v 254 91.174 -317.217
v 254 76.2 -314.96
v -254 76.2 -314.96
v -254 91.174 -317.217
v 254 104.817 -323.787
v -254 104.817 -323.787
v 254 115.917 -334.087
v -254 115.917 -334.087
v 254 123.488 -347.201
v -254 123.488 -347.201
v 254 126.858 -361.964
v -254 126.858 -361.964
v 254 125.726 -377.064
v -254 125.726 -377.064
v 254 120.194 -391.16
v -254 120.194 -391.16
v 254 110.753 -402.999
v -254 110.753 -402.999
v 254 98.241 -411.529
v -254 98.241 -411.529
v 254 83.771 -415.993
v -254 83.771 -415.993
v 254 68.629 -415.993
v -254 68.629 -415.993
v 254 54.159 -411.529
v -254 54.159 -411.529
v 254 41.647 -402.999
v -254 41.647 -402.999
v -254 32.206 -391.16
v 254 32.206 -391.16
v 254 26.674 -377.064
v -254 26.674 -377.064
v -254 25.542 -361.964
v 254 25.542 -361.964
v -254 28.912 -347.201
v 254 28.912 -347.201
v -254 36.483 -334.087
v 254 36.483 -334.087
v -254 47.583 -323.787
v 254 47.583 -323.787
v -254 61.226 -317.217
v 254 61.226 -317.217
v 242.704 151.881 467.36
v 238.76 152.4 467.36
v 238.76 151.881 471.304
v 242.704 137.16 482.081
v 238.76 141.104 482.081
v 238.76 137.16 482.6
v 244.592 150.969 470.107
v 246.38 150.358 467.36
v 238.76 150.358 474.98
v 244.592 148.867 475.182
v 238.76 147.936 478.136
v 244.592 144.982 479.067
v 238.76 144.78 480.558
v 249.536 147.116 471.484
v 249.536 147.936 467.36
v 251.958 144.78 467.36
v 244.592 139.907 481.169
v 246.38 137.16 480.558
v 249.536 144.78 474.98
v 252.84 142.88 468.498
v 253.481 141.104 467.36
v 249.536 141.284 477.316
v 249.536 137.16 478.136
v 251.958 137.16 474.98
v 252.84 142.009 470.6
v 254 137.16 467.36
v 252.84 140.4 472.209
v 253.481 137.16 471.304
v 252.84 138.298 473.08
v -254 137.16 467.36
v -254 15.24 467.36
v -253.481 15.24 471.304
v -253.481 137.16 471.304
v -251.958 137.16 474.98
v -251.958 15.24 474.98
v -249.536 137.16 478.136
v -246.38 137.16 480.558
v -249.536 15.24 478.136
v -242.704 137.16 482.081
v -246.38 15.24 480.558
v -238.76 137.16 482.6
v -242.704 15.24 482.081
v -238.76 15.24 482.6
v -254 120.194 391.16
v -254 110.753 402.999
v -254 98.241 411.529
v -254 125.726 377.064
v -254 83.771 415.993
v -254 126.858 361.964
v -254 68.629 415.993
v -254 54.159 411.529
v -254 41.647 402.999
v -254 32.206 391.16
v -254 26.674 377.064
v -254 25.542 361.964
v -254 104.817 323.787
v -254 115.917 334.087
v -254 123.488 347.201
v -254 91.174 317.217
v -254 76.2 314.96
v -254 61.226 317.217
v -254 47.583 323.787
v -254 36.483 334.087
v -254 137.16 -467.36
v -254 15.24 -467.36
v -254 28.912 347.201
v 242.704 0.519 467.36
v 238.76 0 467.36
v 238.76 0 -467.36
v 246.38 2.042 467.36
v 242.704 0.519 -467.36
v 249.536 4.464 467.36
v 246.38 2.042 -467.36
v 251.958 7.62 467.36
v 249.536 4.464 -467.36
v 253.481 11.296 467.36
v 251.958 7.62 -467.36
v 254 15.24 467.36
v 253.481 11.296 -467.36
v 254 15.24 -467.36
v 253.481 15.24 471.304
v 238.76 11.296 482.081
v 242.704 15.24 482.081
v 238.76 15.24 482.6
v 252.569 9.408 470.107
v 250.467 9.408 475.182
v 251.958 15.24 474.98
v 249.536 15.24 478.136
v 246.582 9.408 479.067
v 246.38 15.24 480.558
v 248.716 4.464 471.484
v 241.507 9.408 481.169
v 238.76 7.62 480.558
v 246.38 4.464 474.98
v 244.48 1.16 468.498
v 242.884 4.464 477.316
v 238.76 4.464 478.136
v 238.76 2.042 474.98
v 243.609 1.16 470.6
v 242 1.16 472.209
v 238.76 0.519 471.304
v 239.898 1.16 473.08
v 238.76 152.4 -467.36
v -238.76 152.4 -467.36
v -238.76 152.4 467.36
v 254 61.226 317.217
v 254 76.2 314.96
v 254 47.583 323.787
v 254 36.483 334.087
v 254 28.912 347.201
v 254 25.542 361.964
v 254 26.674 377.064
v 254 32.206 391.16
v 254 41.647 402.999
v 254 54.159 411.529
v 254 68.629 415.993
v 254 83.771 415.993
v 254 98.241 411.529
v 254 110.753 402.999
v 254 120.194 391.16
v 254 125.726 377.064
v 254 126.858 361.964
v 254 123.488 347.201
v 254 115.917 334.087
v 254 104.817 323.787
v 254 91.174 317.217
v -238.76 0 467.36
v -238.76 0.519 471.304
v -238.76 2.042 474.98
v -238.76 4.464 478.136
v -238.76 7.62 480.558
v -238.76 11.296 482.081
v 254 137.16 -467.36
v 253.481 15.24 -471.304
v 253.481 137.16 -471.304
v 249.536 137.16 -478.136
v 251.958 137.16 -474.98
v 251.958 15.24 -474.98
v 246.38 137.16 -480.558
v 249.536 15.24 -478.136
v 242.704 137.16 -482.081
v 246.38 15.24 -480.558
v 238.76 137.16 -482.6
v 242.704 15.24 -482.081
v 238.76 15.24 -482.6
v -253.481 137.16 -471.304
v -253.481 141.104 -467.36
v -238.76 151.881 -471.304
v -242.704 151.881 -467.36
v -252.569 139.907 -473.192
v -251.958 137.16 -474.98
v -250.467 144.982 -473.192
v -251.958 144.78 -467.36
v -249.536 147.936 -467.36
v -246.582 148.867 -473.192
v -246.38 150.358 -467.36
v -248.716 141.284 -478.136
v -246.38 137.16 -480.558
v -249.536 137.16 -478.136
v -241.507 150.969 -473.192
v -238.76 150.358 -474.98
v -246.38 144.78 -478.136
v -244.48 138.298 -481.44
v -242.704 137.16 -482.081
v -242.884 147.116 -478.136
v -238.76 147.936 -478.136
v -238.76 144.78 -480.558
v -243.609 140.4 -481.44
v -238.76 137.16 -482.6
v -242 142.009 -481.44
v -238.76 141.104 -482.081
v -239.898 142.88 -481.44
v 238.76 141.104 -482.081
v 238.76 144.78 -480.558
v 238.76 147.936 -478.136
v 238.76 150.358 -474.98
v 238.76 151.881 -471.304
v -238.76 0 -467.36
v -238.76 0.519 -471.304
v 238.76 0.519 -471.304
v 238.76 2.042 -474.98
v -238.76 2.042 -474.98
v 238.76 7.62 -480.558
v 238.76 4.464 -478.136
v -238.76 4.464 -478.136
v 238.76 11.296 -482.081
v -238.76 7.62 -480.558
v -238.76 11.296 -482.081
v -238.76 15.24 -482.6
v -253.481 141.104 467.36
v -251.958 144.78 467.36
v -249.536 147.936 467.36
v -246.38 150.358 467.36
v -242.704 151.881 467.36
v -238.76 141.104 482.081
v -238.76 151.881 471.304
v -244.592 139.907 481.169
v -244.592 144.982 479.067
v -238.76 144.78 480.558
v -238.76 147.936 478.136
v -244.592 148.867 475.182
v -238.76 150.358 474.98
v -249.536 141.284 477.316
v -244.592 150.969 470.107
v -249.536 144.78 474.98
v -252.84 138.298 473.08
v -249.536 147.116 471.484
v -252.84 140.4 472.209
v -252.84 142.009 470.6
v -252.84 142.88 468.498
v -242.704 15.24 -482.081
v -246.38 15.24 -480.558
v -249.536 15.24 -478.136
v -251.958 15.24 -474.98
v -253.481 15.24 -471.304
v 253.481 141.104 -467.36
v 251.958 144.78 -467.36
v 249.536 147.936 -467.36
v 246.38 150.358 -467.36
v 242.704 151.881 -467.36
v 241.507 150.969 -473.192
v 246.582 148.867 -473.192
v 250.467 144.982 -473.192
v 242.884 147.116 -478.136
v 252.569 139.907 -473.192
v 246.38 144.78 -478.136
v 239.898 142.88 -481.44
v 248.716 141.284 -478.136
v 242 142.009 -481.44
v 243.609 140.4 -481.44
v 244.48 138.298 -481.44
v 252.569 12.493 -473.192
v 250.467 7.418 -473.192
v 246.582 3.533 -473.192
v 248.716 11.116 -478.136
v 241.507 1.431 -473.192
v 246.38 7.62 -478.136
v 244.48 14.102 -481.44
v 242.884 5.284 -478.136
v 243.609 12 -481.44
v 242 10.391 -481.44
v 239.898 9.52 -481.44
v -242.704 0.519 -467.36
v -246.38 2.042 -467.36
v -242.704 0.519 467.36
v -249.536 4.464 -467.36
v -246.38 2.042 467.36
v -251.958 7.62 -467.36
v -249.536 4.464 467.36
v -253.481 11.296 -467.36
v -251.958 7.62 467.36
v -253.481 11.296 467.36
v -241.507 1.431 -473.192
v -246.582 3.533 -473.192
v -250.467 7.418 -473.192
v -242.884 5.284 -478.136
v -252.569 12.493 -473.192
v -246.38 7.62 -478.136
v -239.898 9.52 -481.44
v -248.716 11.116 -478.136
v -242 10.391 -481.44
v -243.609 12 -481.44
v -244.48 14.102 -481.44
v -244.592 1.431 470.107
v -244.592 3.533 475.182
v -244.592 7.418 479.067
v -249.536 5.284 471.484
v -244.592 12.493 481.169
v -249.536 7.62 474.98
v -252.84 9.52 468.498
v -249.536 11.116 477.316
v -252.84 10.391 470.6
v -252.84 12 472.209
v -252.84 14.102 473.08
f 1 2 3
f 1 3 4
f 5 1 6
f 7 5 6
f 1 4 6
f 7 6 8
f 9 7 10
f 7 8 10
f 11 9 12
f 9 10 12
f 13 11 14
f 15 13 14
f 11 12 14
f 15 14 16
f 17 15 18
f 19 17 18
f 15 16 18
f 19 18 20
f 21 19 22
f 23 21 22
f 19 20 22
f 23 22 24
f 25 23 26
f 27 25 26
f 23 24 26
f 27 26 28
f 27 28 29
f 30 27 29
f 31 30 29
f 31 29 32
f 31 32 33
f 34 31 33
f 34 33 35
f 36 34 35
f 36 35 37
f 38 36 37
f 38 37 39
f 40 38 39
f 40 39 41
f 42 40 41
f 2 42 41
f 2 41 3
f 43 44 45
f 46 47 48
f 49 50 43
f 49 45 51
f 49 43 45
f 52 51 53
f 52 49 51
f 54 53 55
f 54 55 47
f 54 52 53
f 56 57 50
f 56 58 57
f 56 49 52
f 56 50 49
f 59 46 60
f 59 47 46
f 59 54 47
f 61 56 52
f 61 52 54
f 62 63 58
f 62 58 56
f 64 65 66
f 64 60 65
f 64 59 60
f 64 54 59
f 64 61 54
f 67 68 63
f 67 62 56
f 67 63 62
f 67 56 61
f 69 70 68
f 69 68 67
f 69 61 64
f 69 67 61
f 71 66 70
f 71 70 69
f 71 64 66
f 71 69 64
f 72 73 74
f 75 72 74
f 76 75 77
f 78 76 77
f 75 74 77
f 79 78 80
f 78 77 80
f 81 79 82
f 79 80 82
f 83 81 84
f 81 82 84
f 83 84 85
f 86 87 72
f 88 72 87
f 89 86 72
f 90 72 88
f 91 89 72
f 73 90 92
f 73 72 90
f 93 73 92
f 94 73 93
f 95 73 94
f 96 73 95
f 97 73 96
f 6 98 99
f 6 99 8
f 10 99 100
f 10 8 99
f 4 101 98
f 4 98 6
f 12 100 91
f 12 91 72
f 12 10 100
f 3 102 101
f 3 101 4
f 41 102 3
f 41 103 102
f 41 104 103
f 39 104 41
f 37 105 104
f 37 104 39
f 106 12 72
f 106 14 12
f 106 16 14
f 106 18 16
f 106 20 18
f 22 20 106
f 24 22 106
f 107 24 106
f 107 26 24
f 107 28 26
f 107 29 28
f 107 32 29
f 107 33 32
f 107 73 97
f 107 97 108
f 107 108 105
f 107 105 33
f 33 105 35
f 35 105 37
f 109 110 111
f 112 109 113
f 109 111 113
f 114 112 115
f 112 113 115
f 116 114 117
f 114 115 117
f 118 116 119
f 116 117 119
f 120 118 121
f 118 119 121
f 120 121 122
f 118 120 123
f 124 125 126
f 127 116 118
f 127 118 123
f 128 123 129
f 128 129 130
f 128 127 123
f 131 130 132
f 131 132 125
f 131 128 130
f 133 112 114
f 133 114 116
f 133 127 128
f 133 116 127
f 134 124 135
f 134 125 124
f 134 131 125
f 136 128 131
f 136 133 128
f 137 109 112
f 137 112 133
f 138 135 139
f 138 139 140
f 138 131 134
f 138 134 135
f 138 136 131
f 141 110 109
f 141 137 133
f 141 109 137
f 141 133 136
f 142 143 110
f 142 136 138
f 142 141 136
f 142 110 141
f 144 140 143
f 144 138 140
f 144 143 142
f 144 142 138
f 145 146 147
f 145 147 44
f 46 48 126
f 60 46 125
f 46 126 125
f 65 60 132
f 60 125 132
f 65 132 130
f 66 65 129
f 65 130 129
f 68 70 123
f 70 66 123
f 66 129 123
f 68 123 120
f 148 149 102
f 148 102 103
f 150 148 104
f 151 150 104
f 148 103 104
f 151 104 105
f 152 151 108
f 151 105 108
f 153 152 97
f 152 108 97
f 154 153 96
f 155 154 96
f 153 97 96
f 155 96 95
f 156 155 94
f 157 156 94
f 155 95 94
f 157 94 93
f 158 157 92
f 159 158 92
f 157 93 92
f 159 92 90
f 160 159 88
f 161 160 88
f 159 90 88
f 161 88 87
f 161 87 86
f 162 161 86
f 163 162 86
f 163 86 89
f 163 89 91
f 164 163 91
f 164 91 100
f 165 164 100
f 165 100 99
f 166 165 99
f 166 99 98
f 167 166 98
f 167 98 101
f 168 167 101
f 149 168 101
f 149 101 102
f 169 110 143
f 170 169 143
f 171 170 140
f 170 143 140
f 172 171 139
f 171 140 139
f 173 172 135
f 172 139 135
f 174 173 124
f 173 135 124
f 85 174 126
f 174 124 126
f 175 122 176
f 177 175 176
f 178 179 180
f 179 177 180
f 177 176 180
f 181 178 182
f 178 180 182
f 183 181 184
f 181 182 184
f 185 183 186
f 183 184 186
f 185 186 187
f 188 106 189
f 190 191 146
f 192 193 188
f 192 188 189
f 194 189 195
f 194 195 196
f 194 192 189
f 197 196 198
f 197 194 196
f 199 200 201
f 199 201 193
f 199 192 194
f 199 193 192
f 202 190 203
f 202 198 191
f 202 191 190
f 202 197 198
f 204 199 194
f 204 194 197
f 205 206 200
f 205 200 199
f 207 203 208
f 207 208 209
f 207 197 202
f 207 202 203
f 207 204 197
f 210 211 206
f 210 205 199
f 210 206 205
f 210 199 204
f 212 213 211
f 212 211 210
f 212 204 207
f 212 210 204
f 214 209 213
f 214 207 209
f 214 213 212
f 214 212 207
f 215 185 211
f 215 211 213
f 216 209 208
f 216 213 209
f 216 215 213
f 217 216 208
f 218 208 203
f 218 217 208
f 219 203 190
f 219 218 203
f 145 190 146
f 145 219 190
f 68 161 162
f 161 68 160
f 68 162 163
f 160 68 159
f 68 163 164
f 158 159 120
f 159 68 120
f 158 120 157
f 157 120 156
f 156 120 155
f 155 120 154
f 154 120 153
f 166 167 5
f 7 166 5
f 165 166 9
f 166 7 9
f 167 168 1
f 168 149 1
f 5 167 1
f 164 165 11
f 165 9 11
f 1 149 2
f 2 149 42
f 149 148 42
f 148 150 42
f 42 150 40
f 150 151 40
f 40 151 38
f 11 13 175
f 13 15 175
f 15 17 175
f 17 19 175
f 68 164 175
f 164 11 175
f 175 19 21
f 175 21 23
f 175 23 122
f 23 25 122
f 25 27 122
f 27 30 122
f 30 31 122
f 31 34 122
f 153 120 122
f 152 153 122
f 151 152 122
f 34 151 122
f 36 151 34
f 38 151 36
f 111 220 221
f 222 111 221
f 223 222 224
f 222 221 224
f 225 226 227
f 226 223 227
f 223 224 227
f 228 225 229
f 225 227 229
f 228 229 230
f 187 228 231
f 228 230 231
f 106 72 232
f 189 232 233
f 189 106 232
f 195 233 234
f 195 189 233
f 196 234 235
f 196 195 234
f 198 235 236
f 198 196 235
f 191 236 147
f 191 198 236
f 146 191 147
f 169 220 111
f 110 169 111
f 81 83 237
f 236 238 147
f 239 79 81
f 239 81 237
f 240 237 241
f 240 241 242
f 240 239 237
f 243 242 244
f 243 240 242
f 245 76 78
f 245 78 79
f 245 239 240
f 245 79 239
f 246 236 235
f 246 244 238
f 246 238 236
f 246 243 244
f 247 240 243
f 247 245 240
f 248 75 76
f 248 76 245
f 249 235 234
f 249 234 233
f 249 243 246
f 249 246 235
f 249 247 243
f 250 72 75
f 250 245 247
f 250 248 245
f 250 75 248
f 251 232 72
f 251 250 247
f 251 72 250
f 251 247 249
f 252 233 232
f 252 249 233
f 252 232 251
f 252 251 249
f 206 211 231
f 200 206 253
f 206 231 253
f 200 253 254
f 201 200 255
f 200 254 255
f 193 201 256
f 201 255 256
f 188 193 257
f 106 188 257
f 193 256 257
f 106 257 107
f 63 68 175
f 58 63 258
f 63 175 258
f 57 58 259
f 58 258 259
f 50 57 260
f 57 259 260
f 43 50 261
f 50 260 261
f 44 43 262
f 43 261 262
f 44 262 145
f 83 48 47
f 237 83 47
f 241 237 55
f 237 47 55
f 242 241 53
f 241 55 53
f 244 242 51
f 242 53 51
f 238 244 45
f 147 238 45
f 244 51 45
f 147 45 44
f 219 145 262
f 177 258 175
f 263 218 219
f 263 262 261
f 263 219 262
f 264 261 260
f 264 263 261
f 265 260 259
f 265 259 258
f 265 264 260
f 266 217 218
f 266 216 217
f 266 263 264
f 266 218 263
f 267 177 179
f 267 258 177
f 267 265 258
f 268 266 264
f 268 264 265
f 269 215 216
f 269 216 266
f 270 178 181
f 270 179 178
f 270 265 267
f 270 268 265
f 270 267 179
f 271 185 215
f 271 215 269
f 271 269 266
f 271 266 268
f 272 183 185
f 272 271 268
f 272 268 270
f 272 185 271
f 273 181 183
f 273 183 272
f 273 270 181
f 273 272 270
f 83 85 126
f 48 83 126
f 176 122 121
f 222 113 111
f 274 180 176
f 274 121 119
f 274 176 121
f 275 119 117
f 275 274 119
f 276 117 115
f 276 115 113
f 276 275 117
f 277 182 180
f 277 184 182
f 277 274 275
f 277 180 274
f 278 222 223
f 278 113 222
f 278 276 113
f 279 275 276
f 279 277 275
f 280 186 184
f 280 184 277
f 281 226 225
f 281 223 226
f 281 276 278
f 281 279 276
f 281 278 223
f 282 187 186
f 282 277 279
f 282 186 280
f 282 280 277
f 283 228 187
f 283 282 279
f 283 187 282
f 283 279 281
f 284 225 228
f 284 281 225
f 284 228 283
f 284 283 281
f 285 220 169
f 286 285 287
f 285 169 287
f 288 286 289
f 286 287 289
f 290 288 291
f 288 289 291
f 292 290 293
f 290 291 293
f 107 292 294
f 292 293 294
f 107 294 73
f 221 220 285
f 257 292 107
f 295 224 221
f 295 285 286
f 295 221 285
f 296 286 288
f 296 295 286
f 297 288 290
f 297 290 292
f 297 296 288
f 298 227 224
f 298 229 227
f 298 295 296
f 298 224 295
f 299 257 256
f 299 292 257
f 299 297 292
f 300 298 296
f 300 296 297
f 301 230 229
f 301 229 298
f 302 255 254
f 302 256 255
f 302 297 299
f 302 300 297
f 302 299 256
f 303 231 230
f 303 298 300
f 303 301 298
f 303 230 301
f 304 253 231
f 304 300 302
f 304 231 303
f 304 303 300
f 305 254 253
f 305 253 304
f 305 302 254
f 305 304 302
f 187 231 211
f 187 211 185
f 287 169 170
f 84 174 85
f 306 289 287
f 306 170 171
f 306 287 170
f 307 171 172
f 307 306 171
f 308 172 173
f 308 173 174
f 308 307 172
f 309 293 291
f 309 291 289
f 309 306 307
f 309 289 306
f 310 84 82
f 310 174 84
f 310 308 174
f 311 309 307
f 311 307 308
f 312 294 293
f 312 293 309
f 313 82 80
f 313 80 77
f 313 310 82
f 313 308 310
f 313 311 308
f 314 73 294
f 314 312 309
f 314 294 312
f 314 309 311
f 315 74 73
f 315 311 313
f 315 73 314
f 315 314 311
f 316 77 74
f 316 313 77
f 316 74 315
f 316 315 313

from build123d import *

# Parameters (mm, degrees)
SKETCH2_W           = 508
SKETCH2_H           = 965.2
BOSS_EXTRUDE1_DEPTH = 152.4
FILLET1_R           = 15.24
FILLET2_R           = 15.24
SKETCH5_R           = 50.8
CUT_EXTRUDE1_DEPTH  = 718.072186045


with BuildPart() as part:
    # Sketch2 → Boss-Extrude1 (new body)
    with BuildSketch(Plane(origin=(0, 0, 0), x_dir=(1, 0, 0), z_dir=(0, 1, 0))):
        Rectangle(SKETCH2_W, SKETCH2_H)
    extrude(amount=BOSS_EXTRUDE1_DEPTH)

    # Fillet1
    fillet1_edges = [part.edges().sort_by_distance(p)[0] for p in [
        (-254, 152.4, 0),
        (0, 152.4, 482.6),
        (254, 152.4, 0),
        (0, 152.4, -482.6),
    ]]
    fillet(fillet1_edges, radius=FILLET1_R)

    # Fillet2
    # the kernel refuses this fillet: 15.24 mm, written as the material it takes off along each edge
    with BuildSketch(Plane(origin=(238.76, 137.16, -467.36), x_dir=(1, 0, 0), z_dir=(0, 0, -1))) as fillet2_piece_1_section:
        Polygon((0, 0), (FILLET2_R, 0), (FILLET2_R, -FILLET2_R), (0, -FILLET2_R), align=None)
    fillet2_piece_1 = extrude(amount=FILLET2_R, mode=Mode.PRIVATE)
    fillet2_piece_1 = fillet2_piece_1 - Plane(origin=(238.76, 137.16, -467.36), x_dir=(-0.7071067811865475, -0.7071067811865475, 0), z_dir=(0, 0, -1)) * Sphere(FILLET2_R, mode=Mode.PRIVATE)
    add(fillet2_piece_1, mode=Mode.SUBTRACT)
    with BuildSketch(Plane(origin=(238.76, 137.16, 467.36), x_dir=(0, 0, 1), z_dir=(1, 0, 0))) as fillet2_piece_2_section:
        Polygon((0, 0), (FILLET2_R, 0), (FILLET2_R, -FILLET2_R), (0, -FILLET2_R), align=None)
    fillet2_piece_2 = extrude(amount=FILLET2_R, mode=Mode.PRIVATE)
    fillet2_piece_2 = fillet2_piece_2 - Plane(origin=(238.76, 137.16, 467.36), x_dir=(0, -0.7071067811865475, -0.7071067811865475), z_dir=(1, 0, 0)) * Sphere(FILLET2_R, mode=Mode.PRIVATE)
    add(fillet2_piece_2, mode=Mode.SUBTRACT)
    with BuildSketch(Plane(origin=(-238.76, 137.16, -467.36), x_dir=(-1, 0, 0), z_dir=(0, 0, -1))) as fillet2_piece_3_section:
        Polygon((0, 0), (FILLET2_R, 0), (FILLET2_R, FILLET2_R), (0, FILLET2_R), align=None)
    fillet2_piece_3 = extrude(amount=FILLET2_R, mode=Mode.PRIVATE)
    fillet2_piece_3 = fillet2_piece_3 - Plane(origin=(-238.76, 137.16, -467.36), x_dir=(0.7071067811865475, -0.7071067811865475, 0), z_dir=(0, 0, -1)) * Sphere(FILLET2_R, mode=Mode.PRIVATE)
    add(fillet2_piece_3, mode=Mode.SUBTRACT)
    with BuildSketch(Plane(origin=(-238.76, 137.16, 467.36), x_dir=(0, 0, 1), z_dir=(-1, 0, 0))) as fillet2_piece_4_section:
        Polygon((0, 0), (FILLET2_R, 0), (FILLET2_R, FILLET2_R), (0, FILLET2_R), align=None)
    fillet2_piece_4 = extrude(amount=FILLET2_R, mode=Mode.PRIVATE)
    fillet2_piece_4 = fillet2_piece_4 - Plane(origin=(-238.76, 137.16, 467.36), x_dir=(0, -0.7071067811865475, -0.7071067811865475), z_dir=(-1, 0, 0)) * Sphere(FILLET2_R, mode=Mode.PRIVATE)
    add(fillet2_piece_4, mode=Mode.SUBTRACT)
    with BuildSketch(Plane(origin=(-238.76, 15.24, 467.36), x_dir=(0, -1, 0), z_dir=(-1, 0, 0))) as fillet2_piece_5_section:
        Polygon((0, 0), (FILLET2_R, 0), (FILLET2_R, FILLET2_R), (0, FILLET2_R), align=None)
    fillet2_piece_5 = extrude(amount=FILLET2_R, mode=Mode.PRIVATE)
    fillet2_piece_5 = fillet2_piece_5 - Plane(origin=(-238.76, 15.24, 467.36), x_dir=(0, 0.7071067811865475, -0.7071067811865475), z_dir=(-1, 0, 0)) * Sphere(FILLET2_R, mode=Mode.PRIVATE)
    add(fillet2_piece_5, mode=Mode.SUBTRACT)
    with BuildSketch(Plane(origin=(-238.76, 15.24, -467.36), x_dir=(-1, 0, 0), z_dir=(0, 0, -1))) as fillet2_piece_6_section:
        Polygon((0, 0), (FILLET2_R, 0), (FILLET2_R, -FILLET2_R), (0, -FILLET2_R), align=None)
    fillet2_piece_6 = extrude(amount=FILLET2_R, mode=Mode.PRIVATE)
    fillet2_piece_6 = fillet2_piece_6 - Plane(origin=(-238.76, 15.24, -467.36), x_dir=(0.7071067811865475, 0.7071067811865475, 0), z_dir=(0, 0, -1)) * Sphere(FILLET2_R, mode=Mode.PRIVATE)
    add(fillet2_piece_6, mode=Mode.SUBTRACT)
    with BuildSketch(Plane(origin=(238.76, 15.24, 467.36), x_dir=(1, 0, 0), z_dir=(0, -1, 0))) as fillet2_piece_7_section:
        Polygon((0, 0), (FILLET2_R, 0), (FILLET2_R, FILLET2_R), (0, FILLET2_R), align=None)
    fillet2_piece_7 = extrude(amount=FILLET2_R, mode=Mode.PRIVATE)
    fillet2_piece_7 = fillet2_piece_7 - Plane(origin=(238.76, 15.24, 467.36), x_dir=(-0.7071067811865477, 0, -0.7071067811865474), z_dir=(0, -1, 0)) * Sphere(FILLET2_R, mode=Mode.PRIVATE)
    add(fillet2_piece_7, mode=Mode.SUBTRACT)
    with BuildSketch(Plane(origin=(238.76, 15.24, -467.36), x_dir=(0, -1, 0), z_dir=(0, 0, -1))) as fillet2_piece_8_section:
        Polygon((0, 0), (FILLET2_R, 0), (FILLET2_R, -FILLET2_R), (0, -FILLET2_R), align=None)
    fillet2_piece_8 = extrude(amount=FILLET2_R, mode=Mode.PRIVATE)
    fillet2_piece_8 = fillet2_piece_8 - Plane(origin=(238.76, 15.24, -467.36), x_dir=(-0.7071067811865475, 0.7071067811865475, 0), z_dir=(0, 0, -1)) * Sphere(FILLET2_R, mode=Mode.PRIVATE)
    add(fillet2_piece_8, mode=Mode.SUBTRACT)
    with BuildSketch(Plane(origin=(-254, 15.24, 482.6), x_dir=(0, 0, -1), z_dir=(0, 1, 0)), Plane(origin=(-254, 15.24, -482.6), x_dir=(1, 0, 0), z_dir=(0, 1, 0))) as fillet2_piece_9:
        with BuildLine():
            CenterArc((FILLET2_R, -FILLET2_R), FILLET2_R, 90, 90)
            Line((0, -FILLET2_R), (0, 0))
            Line((0, 0), (FILLET2_R, 0))
        make_face()
    extrude(amount=121.92, mode=Mode.SUBTRACT)
    with BuildSketch(Plane(origin=(254, 15.24, 482.6), x_dir=(0, 0, -1), z_dir=(0, 1, 0)), Plane(origin=(254, 15.24, -482.6), x_dir=(-1, 0, 0), z_dir=(0, 1, 0))) as fillet2_piece_10:
        with BuildLine():
            CenterArc((FILLET2_R, FILLET2_R), FILLET2_R, 180, 90)
            Line((0, FILLET2_R), (0, 0))
            Line((0, 0), (FILLET2_R, 0))
        make_face()
    extrude(amount=121.92, mode=Mode.SUBTRACT)
    with BuildSketch(Plane(origin=(238.76, 0, 482.6), x_dir=(0, 0, -1), z_dir=(-1, 0, 0))) as fillet2_piece_11:
        with BuildLine():
            CenterArc((FILLET2_R, -FILLET2_R), FILLET2_R, 90, 90)
            Line((0, -FILLET2_R), (0, 0))
            Line((0, 0), (FILLET2_R, 0))
        make_face()
    extrude(amount=477.52, mode=Mode.SUBTRACT)
    with BuildSketch(Plane(origin=(-254, 0, 467.36), x_dir=(0, 1, 0), z_dir=(0, 0, -1))) as fillet2_piece_12:
        with BuildLine():
            CenterArc((FILLET2_R, FILLET2_R), FILLET2_R, 180, 90)
            Line((0, FILLET2_R), (0, 0))
            Line((0, 0), (FILLET2_R, 0))
        make_face()
    extrude(amount=934.72, mode=Mode.SUBTRACT)
    with BuildSketch(Plane(origin=(-238.76, 0, -482.6), x_dir=(0, 1, 0), z_dir=(1, 0, 0))) as fillet2_piece_13:
        with BuildLine():
            CenterArc((FILLET2_R, FILLET2_R), FILLET2_R, 180, 90)
            Line((0, FILLET2_R), (0, 0))
            Line((0, 0), (FILLET2_R, 0))
        make_face()
    extrude(amount=477.52, mode=Mode.SUBTRACT)
    with BuildSketch(Plane(origin=(254, 0, -467.36), x_dir=(-1, 0, 0), z_dir=(0, 0, 1))) as fillet2_piece_14:
        with BuildLine():
            CenterArc((FILLET2_R, -FILLET2_R), FILLET2_R, 90, 90)
            Line((0, -FILLET2_R), (0, 0))
            Line((0, 0), (FILLET2_R, 0))
        make_face()
    extrude(amount=934.72, mode=Mode.SUBTRACT)

    # Sketch5 → Cut-Extrude1 (cut, through all)
    with BuildSketch(Plane.ZY.offset(254)):
        with Locations((-365.76, 76.2)):
            Circle(SKETCH5_R)
        with Locations(Location((365.76, 76.2, 0), (0, 0, 180))):
            Circle(SKETCH5_R)
    extrude(amount=-CUT_EXTRUDE1_DEPTH, mode=Mode.SUBTRACT)


solid = part.part
